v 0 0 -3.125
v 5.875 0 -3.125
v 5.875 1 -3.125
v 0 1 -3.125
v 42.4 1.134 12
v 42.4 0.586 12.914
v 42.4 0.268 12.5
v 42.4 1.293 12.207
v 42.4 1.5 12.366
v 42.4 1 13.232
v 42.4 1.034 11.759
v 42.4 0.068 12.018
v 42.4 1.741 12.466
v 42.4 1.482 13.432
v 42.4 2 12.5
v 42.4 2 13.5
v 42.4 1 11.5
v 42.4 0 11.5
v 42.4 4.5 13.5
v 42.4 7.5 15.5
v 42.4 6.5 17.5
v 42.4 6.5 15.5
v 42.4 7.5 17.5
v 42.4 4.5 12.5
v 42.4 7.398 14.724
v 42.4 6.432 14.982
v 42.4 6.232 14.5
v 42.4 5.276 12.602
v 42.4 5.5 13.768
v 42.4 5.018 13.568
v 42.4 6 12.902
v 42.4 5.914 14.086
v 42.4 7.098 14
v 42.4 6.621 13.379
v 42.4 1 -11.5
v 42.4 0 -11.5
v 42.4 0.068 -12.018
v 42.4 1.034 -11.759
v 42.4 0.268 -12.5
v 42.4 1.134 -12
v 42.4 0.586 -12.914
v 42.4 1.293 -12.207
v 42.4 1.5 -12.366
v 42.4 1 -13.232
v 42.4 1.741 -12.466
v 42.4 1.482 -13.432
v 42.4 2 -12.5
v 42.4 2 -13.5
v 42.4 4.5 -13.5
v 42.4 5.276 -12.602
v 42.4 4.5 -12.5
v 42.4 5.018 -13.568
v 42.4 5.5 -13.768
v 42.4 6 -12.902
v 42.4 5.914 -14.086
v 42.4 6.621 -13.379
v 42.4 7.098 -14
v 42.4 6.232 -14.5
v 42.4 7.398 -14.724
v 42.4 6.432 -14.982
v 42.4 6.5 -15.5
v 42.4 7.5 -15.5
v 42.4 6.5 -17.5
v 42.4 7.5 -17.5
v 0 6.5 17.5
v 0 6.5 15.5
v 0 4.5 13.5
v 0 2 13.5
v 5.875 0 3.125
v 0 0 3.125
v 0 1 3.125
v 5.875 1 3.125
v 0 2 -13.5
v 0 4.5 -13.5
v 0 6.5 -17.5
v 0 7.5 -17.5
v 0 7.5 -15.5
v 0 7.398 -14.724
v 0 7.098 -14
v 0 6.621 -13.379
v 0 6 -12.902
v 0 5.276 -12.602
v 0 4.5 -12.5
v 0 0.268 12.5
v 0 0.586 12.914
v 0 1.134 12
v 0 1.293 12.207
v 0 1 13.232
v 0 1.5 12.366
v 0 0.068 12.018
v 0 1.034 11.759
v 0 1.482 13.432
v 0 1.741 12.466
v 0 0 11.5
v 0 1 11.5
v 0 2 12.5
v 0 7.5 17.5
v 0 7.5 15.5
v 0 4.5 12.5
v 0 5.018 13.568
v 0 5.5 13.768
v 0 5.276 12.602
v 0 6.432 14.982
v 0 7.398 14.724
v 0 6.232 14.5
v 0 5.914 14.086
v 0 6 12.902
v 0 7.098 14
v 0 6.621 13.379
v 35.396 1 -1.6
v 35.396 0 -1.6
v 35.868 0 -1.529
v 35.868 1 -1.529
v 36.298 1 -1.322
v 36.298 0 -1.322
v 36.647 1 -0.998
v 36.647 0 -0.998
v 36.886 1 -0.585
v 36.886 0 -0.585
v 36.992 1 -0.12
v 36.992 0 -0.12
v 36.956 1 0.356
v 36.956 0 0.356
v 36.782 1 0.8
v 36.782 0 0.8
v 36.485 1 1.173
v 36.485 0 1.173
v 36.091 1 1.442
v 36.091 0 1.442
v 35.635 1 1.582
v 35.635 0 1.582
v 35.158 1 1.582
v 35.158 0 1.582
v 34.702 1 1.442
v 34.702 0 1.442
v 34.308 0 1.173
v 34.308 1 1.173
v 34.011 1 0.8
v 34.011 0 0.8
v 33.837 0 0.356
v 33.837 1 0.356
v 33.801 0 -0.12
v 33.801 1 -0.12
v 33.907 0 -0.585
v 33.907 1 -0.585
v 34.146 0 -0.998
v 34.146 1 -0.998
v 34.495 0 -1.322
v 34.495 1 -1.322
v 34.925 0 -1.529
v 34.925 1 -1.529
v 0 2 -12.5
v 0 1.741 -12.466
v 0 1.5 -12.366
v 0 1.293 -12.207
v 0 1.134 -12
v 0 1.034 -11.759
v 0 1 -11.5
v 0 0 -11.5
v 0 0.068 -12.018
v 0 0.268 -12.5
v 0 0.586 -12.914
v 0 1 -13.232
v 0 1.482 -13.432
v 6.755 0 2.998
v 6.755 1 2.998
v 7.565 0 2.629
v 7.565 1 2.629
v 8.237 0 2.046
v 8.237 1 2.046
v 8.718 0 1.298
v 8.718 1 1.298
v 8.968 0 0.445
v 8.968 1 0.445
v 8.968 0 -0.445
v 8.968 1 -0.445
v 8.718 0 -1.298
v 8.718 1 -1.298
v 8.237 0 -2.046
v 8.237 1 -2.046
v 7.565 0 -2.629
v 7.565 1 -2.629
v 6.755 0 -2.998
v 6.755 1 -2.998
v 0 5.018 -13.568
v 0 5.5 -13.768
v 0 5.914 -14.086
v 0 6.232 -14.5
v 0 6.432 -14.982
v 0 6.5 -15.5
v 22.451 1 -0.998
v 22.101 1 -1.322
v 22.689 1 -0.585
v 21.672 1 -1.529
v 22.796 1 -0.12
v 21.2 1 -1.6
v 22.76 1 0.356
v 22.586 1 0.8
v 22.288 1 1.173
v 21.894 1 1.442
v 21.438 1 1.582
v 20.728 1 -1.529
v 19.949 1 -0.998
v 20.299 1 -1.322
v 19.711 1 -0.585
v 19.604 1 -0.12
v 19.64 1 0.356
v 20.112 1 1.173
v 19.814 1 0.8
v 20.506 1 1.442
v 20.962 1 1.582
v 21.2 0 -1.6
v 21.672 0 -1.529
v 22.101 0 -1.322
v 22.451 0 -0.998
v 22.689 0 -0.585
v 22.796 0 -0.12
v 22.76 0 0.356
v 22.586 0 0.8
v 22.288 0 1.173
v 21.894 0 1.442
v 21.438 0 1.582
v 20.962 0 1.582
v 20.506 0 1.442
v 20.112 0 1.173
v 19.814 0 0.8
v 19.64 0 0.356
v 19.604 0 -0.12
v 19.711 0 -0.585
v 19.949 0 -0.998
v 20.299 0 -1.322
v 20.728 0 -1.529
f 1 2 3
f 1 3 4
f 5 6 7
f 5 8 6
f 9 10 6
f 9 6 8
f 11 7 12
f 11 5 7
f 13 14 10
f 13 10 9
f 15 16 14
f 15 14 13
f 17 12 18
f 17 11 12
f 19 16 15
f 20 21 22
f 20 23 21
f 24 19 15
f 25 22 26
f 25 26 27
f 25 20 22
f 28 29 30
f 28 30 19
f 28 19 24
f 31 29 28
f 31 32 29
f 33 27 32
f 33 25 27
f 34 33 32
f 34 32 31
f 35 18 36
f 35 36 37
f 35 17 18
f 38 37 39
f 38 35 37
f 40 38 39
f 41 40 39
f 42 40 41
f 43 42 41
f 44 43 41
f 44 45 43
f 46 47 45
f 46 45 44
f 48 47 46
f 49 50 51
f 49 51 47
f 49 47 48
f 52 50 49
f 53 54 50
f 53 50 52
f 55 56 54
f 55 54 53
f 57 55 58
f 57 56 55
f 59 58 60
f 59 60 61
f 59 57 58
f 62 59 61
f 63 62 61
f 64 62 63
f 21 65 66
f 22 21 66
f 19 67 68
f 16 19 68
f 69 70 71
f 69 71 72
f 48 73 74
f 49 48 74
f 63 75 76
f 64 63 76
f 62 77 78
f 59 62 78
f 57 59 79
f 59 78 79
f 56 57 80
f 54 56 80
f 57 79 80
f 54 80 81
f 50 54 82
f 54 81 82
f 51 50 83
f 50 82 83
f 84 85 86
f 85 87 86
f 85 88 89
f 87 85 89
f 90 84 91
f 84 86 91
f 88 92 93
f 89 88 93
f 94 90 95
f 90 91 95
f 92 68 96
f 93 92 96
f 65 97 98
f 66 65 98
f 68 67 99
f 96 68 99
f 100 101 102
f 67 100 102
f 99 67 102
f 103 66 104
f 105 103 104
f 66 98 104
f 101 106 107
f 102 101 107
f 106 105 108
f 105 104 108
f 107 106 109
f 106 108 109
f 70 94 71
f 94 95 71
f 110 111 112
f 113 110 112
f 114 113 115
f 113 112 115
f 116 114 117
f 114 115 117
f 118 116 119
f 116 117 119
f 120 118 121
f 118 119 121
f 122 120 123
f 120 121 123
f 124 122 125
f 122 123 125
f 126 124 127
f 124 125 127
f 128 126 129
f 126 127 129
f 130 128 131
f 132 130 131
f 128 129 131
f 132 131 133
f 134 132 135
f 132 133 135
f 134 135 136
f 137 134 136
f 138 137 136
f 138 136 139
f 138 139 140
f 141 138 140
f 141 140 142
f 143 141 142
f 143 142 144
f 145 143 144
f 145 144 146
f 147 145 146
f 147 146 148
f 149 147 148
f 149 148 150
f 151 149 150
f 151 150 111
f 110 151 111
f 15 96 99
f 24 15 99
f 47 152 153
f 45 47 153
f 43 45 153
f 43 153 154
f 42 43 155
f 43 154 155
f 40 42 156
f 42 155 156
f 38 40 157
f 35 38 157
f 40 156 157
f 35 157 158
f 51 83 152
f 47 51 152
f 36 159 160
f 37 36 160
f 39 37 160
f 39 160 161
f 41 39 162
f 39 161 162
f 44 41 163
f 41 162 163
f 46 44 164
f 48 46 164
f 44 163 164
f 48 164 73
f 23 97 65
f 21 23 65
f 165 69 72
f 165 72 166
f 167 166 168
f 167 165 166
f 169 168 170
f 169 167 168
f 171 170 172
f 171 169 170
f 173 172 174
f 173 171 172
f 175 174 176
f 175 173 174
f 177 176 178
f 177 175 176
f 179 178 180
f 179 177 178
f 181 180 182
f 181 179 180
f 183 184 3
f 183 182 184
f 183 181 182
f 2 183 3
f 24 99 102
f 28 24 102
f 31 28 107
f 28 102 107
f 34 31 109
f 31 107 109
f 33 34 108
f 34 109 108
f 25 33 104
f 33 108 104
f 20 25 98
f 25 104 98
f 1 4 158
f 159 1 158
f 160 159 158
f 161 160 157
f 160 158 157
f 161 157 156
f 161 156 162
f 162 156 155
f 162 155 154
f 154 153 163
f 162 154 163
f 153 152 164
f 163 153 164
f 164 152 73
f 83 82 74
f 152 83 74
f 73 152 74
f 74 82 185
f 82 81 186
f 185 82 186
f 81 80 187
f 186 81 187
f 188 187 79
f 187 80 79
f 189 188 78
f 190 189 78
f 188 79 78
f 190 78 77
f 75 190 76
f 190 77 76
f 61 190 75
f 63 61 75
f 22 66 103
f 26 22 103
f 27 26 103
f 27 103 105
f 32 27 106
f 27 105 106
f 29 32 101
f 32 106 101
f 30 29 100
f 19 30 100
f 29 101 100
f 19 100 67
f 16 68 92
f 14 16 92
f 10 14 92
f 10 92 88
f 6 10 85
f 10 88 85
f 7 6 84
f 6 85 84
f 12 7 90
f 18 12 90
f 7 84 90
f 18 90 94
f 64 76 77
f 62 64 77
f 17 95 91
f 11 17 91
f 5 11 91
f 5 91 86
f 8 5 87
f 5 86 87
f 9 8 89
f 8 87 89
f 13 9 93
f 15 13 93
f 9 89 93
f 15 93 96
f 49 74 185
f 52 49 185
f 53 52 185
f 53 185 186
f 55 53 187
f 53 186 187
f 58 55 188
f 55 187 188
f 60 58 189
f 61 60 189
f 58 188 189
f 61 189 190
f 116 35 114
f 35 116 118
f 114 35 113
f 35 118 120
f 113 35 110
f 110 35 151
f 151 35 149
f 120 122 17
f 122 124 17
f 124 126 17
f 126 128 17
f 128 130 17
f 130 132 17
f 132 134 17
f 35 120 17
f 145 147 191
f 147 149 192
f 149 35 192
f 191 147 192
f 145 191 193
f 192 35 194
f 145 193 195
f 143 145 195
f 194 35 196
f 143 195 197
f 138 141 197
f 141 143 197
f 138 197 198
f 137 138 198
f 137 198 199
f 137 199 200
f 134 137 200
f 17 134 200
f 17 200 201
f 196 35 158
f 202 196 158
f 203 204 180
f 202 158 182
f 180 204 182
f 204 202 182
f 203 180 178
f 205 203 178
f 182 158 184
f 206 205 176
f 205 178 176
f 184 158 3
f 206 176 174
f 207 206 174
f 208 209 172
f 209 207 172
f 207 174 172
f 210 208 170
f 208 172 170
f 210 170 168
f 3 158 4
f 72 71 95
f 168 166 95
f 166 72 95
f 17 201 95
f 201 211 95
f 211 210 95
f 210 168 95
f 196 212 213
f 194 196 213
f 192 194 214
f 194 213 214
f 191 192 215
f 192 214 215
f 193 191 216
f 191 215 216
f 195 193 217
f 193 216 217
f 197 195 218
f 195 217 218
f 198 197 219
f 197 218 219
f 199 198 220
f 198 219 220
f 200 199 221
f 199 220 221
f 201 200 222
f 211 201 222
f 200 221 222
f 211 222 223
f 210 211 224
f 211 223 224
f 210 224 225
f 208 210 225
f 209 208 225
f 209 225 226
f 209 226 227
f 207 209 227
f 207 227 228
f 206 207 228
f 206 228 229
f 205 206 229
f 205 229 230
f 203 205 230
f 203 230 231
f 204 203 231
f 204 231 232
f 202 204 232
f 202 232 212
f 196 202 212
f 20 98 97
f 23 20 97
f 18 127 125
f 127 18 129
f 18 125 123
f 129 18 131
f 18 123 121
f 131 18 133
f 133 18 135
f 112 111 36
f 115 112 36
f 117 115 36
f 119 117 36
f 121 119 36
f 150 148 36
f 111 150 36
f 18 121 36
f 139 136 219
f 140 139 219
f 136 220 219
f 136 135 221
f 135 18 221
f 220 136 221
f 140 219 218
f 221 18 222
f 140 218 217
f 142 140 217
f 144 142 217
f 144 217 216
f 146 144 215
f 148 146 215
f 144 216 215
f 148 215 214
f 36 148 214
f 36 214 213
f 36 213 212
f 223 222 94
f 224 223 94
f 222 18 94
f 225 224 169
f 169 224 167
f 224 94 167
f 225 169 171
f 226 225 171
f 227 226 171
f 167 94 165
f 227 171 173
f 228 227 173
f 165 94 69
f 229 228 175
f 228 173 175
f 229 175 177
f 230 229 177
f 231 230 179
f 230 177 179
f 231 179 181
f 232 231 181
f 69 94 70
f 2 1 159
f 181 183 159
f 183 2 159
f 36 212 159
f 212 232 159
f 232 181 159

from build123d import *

# Parameters (mm, degrees)
EXTRUDE_THIN1_DEPTH        = 42.4
CUT_EXTRUDE1_REACH         = 48.479
SZKIC1_R                   = 1.6
WYTNIJ_WYCI_GNI_CIE1_DEPTH = 47.478597225


with BuildPart() as part:
    # Sketch1 → Extrude-Thin1 (new body)
    with BuildSketch(Plane(origin=(0, 0, 0), x_dir=(0, 0, -1), z_dir=(1, 0, 0))):
        with BuildLine():
            Line((-17.5, 6.5), (-15.5, 6.5))
            ThreePointArc((-15.5, 6.5), (-14.085786438, 5.914213562), (-13.5, 4.5))
            Line((-13.5, 4.5), (-13.5, 2))
            ThreePointArc((-13.5, 2), (-12.914213562, 0.585786438), (-11.5, 0))
            Line((-11.5, 0), (11.5, 0))
            ThreePointArc((11.5, 0), (12.914213562, 0.585786438), (13.5, 2))
            Line((13.5, 2), (13.5, 4.5))
            ThreePointArc((13.5, 4.5), (14.085786438, 5.914213562), (15.5, 6.5))
            Line((15.5, 6.5), (17.5, 6.5))
            Line((17.5, 6.5), (17.5, 7.5))
            Line((17.5, 7.5), (15.5, 7.5))
            ThreePointArc((15.5, 7.5), (13.378679656, 6.621320344), (12.5, 4.5))
            Line((12.5, 4.5), (12.5, 2))
            ThreePointArc((12.5, 2), (12.207106781, 1.292893219), (11.5, 1))
            Line((11.5, 1), (-11.5, 1))
            ThreePointArc((-11.5, 1), (-12.207106781, 1.292893219), (-12.5, 2))
            Line((-12.5, 2), (-12.5, 4.5))
            ThreePointArc((-12.5, 4.5), (-13.378679656, 6.621320344), (-15.5, 7.5))
            Line((-15.5, 7.5), (-17.5, 7.5))
            Line((-17.5, 7.5), (-17.5, 6.5))
        make_face()
    extrude(amount=EXTRUDE_THIN1_DEPTH)

    # Sketch2 → Cut-Extrude1 (cut, up to next)
    with BuildSketch(Plane.XZ, mode=Mode.PRIVATE) as cut_extrude1_sk1:
        with BuildLine():
            Line((-5.875, 3.125), (5.875, 3.125))
            ThreePointArc((5.875, 3.125), (9, 0), (5.875, -3.125))
            Line((5.875, -3.125), (-5.875, -3.125))
            ThreePointArc((-5.875, -3.125), (-9, 0), (-5.875, 3.125))
        make_face()
    cut_extrude1_tool1 = extrude(cut_extrude1_sk1.sketch, amount=-CUT_EXTRUDE1_REACH, mode=Mode.PRIVATE) & part.part
    add(cut_extrude1_tool1.solids().sort_by_distance((0, 0, 0))[0], mode=Mode.SUBTRACT)

    # Szkic1 → Wytnij-wyciągnięcie1 (cut, through all)
    with BuildSketch(Plane.XZ):
        with Locations(Location((35.396484606, 0, 0), (0, 0, 270))):
            Circle(SZKIC1_R)
        with Locations(Location((21.2, 0, 0), (0, 0, 270))):
            Circle(SZKIC1_R)
    extrude(amount=-WYTNIJ_WYCI_GNI_CIE1_DEPTH, mode=Mode.SUBTRACT)


solid = part.part
